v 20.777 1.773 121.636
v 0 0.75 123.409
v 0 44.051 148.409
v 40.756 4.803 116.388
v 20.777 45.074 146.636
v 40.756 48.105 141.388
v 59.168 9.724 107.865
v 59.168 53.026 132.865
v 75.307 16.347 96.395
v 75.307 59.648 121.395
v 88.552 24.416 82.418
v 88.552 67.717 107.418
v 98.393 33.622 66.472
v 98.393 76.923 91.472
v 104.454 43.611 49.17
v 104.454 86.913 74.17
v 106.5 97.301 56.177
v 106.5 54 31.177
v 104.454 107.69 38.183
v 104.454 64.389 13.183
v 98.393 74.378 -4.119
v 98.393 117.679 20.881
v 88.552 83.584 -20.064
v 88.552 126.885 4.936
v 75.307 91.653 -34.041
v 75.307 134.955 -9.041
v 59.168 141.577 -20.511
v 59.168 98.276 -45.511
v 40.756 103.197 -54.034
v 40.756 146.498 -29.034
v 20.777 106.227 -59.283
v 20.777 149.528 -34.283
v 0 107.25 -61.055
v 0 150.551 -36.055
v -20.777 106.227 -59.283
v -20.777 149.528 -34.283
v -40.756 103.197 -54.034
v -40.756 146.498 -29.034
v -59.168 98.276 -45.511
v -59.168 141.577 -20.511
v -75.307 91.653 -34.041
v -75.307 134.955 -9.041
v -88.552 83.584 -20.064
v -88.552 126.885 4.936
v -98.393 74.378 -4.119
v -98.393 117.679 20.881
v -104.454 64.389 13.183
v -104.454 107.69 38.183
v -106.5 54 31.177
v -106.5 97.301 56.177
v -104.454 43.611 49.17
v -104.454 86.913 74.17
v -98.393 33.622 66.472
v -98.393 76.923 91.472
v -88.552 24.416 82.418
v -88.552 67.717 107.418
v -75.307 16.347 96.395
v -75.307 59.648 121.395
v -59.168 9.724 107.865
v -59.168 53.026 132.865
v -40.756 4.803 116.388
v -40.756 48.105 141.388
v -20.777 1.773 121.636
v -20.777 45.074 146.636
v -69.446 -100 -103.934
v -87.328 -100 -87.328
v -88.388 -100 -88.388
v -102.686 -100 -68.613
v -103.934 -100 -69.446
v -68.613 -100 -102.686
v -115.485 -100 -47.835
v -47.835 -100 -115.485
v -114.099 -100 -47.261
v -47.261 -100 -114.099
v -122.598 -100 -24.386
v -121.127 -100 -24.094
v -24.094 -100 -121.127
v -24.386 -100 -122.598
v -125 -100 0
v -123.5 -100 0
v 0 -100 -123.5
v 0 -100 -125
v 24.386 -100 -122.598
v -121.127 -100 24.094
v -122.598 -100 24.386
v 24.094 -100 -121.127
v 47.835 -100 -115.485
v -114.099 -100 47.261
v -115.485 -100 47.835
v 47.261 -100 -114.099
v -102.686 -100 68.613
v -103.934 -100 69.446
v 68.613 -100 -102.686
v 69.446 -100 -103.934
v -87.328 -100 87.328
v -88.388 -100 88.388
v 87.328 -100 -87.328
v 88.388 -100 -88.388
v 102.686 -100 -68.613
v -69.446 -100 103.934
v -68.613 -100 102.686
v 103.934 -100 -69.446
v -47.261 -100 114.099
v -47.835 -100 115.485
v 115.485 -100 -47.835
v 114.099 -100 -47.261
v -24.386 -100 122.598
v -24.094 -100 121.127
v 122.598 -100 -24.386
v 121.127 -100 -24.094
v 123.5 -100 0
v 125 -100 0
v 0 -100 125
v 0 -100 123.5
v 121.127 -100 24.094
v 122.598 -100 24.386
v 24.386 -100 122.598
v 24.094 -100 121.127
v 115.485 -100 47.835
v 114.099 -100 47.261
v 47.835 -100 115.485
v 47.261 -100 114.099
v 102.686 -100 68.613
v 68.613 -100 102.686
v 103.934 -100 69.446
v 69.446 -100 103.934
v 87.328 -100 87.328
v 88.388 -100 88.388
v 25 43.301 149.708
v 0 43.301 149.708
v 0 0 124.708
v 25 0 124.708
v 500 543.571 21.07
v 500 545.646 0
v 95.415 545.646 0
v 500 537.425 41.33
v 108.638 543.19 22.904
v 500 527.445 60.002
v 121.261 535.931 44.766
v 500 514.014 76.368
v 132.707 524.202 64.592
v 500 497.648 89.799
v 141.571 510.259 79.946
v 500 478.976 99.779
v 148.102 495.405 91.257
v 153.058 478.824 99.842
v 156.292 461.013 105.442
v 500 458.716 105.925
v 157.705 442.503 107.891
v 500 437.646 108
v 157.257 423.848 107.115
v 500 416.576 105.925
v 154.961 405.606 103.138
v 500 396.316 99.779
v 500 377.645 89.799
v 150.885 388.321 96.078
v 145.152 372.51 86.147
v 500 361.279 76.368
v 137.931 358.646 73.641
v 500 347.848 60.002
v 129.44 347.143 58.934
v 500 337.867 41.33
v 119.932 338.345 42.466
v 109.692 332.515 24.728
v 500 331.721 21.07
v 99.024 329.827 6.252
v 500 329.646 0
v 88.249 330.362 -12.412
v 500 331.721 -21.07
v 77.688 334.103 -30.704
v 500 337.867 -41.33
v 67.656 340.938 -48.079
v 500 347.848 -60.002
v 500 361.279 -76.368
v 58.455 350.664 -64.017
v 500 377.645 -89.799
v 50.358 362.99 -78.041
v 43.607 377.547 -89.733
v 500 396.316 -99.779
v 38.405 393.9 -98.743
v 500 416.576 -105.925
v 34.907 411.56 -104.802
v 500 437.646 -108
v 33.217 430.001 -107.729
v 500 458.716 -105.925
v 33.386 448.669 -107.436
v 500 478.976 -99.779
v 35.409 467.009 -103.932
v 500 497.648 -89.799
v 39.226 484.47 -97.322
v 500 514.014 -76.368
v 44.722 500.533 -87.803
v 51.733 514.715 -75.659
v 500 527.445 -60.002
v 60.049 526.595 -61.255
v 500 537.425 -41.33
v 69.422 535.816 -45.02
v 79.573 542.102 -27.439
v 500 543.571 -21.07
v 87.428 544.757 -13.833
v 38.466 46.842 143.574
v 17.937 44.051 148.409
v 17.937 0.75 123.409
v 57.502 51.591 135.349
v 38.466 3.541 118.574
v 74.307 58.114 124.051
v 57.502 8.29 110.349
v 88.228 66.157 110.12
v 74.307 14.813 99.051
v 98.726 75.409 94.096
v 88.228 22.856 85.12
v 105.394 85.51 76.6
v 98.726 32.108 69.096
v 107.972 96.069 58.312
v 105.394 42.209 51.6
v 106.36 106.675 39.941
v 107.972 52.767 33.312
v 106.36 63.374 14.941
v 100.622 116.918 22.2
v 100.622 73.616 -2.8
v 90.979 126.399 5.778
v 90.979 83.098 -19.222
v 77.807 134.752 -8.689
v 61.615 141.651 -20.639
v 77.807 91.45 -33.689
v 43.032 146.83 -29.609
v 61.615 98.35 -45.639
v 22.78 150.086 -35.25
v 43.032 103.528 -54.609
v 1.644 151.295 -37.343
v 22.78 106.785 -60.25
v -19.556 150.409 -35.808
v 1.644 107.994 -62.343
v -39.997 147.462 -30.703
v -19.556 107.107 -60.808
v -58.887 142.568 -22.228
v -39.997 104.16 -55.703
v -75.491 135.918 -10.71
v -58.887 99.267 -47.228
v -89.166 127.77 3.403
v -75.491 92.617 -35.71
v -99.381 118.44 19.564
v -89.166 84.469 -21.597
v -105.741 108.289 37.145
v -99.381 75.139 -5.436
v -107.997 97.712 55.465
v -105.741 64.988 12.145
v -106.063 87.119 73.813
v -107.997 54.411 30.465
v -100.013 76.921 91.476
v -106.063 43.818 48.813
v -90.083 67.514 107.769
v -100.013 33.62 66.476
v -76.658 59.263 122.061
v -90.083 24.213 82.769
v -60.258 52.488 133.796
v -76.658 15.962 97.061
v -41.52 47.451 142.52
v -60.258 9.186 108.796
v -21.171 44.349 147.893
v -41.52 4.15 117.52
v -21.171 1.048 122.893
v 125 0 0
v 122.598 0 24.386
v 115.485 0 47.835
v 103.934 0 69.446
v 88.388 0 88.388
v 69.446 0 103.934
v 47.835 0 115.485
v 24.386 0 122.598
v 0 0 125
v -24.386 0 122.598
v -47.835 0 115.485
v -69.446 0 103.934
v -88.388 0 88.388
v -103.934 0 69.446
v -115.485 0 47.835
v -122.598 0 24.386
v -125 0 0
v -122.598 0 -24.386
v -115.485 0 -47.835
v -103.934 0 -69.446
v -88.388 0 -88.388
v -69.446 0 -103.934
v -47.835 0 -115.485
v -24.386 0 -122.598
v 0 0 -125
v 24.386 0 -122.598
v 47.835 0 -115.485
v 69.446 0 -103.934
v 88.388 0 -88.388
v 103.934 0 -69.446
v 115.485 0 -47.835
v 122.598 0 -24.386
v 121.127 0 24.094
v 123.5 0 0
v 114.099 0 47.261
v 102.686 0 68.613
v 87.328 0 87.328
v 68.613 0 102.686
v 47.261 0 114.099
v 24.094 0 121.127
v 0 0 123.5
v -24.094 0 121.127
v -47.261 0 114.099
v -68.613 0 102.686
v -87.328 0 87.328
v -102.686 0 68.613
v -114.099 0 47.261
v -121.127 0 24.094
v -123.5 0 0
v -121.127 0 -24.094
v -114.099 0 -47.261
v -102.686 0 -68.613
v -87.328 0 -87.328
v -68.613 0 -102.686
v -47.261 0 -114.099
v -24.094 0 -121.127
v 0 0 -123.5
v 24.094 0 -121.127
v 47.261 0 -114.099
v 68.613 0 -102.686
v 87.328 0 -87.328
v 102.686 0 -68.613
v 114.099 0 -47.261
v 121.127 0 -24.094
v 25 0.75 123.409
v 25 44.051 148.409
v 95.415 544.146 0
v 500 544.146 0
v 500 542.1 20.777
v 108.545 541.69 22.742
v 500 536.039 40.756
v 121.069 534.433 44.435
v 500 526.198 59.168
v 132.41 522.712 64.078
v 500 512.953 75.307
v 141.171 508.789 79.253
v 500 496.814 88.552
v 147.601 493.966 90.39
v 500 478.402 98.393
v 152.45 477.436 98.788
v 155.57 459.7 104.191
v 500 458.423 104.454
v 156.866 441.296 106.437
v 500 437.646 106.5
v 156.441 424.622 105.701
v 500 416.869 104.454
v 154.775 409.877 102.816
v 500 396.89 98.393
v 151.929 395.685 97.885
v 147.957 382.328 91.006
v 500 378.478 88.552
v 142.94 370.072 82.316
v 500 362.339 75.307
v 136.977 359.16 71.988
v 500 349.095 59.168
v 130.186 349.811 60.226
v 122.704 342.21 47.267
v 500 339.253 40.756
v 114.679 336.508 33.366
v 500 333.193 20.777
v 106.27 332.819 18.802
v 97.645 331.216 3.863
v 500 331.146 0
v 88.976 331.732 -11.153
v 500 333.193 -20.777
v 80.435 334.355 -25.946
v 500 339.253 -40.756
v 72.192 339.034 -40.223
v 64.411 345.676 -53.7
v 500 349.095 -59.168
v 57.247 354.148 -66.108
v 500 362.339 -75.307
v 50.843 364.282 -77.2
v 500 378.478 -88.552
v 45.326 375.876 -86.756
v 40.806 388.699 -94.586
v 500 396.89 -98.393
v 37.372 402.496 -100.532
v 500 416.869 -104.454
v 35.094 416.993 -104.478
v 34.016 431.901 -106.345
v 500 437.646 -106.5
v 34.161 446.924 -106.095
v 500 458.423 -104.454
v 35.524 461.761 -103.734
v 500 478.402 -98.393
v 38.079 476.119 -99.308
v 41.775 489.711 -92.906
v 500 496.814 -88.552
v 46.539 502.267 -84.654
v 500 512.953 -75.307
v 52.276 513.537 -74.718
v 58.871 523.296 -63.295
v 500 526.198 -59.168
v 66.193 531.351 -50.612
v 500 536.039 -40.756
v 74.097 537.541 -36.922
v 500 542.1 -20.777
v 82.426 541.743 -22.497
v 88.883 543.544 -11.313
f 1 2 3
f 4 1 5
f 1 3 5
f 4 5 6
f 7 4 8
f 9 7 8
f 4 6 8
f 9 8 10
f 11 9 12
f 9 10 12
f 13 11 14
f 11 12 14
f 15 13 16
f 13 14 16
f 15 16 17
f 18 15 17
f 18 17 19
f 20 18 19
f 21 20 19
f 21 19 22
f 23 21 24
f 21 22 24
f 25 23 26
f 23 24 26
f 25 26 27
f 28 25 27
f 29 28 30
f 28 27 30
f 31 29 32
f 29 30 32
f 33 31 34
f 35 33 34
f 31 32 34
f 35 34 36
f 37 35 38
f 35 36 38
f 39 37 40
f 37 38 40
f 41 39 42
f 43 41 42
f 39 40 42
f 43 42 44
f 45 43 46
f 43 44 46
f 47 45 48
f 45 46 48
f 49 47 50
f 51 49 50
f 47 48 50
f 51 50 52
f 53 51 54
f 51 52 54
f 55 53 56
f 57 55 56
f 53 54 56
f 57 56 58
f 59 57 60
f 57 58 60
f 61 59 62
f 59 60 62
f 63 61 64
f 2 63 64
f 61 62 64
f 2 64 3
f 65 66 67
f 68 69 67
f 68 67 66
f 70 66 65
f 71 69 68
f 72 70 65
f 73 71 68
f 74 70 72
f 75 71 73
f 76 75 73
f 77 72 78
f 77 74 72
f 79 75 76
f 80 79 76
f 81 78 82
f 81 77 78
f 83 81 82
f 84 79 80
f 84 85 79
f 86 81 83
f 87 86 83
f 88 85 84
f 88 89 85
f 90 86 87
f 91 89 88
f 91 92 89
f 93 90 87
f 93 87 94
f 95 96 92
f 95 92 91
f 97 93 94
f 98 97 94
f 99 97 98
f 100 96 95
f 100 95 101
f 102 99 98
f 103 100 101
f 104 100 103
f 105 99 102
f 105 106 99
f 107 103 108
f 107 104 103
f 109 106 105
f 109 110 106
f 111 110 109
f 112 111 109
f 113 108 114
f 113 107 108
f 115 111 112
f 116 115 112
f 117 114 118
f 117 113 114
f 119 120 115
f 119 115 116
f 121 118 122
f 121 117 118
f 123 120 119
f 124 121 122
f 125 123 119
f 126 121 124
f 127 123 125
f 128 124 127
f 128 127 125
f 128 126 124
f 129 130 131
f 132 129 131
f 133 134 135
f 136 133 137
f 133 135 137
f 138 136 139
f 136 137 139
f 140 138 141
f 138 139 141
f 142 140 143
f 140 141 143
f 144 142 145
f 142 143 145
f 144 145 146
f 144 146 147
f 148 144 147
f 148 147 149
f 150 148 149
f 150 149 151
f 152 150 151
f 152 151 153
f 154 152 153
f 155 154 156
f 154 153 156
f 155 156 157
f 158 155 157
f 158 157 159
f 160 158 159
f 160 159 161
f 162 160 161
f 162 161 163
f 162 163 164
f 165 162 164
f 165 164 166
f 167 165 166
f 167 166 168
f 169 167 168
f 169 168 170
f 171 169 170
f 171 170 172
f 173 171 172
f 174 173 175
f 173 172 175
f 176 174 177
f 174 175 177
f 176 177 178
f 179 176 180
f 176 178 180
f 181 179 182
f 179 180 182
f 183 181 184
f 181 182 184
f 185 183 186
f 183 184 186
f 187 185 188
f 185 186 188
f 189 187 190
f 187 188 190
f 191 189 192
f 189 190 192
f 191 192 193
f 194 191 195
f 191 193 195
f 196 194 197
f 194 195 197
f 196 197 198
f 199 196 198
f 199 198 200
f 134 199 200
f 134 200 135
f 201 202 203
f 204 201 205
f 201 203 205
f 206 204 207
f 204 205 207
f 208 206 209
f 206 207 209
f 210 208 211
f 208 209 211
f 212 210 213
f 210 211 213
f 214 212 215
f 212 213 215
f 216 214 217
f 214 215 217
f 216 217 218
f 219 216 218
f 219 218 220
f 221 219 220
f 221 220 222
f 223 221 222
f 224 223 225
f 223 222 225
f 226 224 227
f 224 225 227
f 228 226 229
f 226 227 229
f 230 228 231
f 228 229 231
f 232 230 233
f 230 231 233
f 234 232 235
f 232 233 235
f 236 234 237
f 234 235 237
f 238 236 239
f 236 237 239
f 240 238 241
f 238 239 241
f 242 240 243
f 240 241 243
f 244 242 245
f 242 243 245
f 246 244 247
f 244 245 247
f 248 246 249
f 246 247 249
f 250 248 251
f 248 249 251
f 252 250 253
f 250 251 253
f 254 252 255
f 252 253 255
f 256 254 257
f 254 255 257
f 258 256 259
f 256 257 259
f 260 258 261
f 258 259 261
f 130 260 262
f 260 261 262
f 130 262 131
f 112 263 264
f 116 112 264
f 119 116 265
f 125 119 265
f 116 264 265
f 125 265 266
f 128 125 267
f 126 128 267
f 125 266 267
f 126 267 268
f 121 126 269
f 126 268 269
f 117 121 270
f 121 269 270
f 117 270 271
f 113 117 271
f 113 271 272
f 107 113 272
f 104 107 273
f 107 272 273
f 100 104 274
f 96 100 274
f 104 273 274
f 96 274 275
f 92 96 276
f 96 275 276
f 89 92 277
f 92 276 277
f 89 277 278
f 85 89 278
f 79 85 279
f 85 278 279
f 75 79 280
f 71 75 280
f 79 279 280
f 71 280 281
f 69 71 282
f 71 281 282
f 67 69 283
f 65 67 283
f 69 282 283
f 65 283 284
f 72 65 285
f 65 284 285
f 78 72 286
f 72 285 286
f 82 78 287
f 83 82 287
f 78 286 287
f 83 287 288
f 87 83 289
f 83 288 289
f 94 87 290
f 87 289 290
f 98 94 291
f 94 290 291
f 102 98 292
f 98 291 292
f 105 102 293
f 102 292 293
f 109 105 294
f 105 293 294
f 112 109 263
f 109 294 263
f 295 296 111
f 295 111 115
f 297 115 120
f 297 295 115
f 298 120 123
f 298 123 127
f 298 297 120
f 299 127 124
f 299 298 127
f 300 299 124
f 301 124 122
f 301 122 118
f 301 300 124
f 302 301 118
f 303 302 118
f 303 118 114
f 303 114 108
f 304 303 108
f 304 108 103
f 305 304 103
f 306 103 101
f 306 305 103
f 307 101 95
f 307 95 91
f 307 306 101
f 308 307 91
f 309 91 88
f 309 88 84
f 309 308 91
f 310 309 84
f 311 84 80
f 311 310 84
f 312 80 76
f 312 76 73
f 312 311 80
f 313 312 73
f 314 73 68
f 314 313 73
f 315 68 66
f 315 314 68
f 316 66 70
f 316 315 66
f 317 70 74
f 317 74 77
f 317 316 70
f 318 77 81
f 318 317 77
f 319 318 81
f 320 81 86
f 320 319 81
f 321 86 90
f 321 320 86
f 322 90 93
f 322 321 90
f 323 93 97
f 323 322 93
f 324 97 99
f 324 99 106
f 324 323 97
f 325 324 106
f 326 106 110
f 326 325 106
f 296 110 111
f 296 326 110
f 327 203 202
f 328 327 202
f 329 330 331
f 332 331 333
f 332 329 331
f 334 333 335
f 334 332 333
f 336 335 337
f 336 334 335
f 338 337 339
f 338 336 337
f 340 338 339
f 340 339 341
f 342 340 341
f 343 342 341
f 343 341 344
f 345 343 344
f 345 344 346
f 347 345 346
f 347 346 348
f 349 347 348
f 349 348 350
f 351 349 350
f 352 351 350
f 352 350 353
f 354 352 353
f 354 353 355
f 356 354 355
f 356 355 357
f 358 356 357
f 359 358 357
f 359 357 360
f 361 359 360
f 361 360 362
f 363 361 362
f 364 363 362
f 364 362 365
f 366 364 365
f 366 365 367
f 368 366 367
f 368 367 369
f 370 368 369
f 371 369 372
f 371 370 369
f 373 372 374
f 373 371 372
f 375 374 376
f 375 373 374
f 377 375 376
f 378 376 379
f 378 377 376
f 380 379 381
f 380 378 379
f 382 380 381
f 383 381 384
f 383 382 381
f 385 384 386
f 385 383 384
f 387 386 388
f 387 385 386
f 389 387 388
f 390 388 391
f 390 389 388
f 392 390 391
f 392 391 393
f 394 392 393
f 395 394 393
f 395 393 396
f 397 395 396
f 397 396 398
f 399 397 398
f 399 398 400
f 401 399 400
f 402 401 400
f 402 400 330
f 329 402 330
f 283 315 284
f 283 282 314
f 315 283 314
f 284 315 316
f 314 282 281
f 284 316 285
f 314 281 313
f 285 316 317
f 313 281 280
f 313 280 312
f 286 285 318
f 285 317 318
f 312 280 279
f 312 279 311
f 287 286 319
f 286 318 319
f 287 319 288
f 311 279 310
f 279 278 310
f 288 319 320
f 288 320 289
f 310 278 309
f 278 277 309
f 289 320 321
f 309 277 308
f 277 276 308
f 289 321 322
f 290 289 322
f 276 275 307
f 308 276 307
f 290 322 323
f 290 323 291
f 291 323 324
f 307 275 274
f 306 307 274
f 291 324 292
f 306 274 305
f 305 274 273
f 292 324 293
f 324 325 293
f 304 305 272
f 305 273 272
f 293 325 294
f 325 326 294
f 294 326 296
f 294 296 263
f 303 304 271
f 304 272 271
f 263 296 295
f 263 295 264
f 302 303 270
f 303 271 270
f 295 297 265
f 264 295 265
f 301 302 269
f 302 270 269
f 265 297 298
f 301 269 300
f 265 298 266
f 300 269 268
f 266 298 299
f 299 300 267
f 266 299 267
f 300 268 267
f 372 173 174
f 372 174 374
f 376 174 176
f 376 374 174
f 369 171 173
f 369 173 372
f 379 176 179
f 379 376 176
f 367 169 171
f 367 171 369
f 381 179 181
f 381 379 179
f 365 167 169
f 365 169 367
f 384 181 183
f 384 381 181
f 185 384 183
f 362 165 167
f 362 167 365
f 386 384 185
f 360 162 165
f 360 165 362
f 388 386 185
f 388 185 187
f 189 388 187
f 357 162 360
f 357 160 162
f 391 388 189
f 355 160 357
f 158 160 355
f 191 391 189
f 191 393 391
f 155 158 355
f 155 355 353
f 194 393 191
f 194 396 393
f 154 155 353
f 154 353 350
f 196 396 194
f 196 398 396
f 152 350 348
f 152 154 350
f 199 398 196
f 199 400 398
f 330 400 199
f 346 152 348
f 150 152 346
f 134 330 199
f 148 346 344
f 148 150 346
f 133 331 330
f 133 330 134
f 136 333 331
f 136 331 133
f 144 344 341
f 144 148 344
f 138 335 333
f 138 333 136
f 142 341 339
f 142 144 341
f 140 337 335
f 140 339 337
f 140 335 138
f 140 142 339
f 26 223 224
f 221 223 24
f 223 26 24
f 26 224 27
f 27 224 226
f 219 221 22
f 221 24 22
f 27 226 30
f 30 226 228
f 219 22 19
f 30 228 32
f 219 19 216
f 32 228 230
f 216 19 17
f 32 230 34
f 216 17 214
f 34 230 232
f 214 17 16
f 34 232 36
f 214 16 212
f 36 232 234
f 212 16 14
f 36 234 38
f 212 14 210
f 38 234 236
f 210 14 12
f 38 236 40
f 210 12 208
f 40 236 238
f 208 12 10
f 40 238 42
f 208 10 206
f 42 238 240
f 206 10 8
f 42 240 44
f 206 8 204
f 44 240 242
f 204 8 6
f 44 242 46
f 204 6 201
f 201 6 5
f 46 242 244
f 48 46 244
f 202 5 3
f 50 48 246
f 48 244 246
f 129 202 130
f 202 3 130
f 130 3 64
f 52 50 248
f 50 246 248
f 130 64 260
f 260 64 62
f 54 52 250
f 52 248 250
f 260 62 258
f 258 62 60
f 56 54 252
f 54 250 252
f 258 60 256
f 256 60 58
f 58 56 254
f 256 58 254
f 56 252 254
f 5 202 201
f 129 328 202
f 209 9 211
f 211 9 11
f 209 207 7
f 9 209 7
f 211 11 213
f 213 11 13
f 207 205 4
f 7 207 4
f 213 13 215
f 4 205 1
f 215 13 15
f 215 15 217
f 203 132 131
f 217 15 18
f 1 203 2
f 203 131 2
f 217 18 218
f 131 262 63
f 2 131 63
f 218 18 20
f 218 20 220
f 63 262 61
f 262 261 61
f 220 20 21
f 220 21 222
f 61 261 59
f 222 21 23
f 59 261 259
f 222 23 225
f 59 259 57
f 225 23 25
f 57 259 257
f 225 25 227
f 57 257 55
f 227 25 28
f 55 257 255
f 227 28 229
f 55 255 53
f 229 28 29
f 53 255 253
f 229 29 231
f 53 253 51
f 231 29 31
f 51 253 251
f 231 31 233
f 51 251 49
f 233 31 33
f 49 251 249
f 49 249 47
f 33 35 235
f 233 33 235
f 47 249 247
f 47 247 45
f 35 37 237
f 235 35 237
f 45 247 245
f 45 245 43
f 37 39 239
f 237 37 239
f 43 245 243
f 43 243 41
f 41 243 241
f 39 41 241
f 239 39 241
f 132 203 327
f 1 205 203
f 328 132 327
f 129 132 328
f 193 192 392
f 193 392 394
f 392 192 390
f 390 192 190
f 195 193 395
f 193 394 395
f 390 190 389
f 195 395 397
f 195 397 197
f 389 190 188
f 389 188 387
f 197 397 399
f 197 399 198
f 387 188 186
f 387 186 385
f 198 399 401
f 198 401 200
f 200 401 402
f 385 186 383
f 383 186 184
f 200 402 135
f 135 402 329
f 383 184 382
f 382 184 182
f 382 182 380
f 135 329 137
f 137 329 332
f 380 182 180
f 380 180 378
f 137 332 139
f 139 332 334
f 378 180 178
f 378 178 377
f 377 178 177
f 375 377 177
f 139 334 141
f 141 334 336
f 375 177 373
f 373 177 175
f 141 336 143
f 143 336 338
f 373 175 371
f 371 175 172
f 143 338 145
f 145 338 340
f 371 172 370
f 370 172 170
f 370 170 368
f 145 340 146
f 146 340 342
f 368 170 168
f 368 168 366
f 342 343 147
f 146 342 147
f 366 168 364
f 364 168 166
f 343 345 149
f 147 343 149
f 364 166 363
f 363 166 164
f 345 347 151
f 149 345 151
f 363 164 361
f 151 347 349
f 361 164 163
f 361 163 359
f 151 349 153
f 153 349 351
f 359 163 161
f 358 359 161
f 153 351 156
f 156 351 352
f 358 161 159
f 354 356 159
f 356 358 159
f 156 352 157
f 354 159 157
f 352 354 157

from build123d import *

# Parameters (mm, degrees)
F0_R     = 125
F0_R_2   = 123.5
F1_DEPTH = 100
F4_DEPTH = 25
F5_R     = 108
F5_R_2   = 106.5
F6_DEPTH = 500
F8_DEPTH = 600


with BuildPart() as f1:
    # F0 (on Front) → F1 (new body)
    with BuildSketch(Plane.XZ):
        Circle(F0_R)
        Circle(F0_R_2, mode=Mode.SUBTRACT)
    extrude(amount=F1_DEPTH)


with BuildPart() as f3:
    # F2 (on Right) → F3 (revolve)
    with BuildSketch(Plane.YZ):
        Polygon((43.3012701892, 149.707658145), (0, 124.707658145), (0.75, 123.4086200393), (44.0512701892, 148.4086200393), align=None)
    revolve(axis=Axis((0, 48.6506350946, 28.0884572681), (0, 0.8660254038, 0.5)))

    # F2 (on Right) → F4 (join)
    with BuildSketch(Plane.YZ):
        Polygon((43.3012701892, 149.707658145), (0, 124.707658145), (0.75, 123.4086200393), (44.0512701892, 148.4086200393), align=None)
    extrude(amount=F4_DEPTH)


with BuildPart() as f6:
    # F5 (on Right) → F6 (new body)
    with BuildSketch(Plane.YZ):
        with Locations((437.6462212987, 0)):
            Circle(F5_R)
        with Locations((437.6462212987, 0)):
            Circle(F5_R_2, mode=Mode.SUBTRACT)
    extrude(amount=F6_DEPTH)

    # F7 (on Front) → F8 (cut)
    with BuildSketch(Plane.XZ):
        Polygon((-296.155548444, 26.1171597825), (8.8311323739, -149.966982487), (209.2771804602, 197.2157569749), (-95.7095003577, 373.2998992443), align=None)
    extrude(amount=-F8_DEPTH, mode=Mode.SUBTRACT)


solid = Compound([f1.part, f3.part, f6.part])
